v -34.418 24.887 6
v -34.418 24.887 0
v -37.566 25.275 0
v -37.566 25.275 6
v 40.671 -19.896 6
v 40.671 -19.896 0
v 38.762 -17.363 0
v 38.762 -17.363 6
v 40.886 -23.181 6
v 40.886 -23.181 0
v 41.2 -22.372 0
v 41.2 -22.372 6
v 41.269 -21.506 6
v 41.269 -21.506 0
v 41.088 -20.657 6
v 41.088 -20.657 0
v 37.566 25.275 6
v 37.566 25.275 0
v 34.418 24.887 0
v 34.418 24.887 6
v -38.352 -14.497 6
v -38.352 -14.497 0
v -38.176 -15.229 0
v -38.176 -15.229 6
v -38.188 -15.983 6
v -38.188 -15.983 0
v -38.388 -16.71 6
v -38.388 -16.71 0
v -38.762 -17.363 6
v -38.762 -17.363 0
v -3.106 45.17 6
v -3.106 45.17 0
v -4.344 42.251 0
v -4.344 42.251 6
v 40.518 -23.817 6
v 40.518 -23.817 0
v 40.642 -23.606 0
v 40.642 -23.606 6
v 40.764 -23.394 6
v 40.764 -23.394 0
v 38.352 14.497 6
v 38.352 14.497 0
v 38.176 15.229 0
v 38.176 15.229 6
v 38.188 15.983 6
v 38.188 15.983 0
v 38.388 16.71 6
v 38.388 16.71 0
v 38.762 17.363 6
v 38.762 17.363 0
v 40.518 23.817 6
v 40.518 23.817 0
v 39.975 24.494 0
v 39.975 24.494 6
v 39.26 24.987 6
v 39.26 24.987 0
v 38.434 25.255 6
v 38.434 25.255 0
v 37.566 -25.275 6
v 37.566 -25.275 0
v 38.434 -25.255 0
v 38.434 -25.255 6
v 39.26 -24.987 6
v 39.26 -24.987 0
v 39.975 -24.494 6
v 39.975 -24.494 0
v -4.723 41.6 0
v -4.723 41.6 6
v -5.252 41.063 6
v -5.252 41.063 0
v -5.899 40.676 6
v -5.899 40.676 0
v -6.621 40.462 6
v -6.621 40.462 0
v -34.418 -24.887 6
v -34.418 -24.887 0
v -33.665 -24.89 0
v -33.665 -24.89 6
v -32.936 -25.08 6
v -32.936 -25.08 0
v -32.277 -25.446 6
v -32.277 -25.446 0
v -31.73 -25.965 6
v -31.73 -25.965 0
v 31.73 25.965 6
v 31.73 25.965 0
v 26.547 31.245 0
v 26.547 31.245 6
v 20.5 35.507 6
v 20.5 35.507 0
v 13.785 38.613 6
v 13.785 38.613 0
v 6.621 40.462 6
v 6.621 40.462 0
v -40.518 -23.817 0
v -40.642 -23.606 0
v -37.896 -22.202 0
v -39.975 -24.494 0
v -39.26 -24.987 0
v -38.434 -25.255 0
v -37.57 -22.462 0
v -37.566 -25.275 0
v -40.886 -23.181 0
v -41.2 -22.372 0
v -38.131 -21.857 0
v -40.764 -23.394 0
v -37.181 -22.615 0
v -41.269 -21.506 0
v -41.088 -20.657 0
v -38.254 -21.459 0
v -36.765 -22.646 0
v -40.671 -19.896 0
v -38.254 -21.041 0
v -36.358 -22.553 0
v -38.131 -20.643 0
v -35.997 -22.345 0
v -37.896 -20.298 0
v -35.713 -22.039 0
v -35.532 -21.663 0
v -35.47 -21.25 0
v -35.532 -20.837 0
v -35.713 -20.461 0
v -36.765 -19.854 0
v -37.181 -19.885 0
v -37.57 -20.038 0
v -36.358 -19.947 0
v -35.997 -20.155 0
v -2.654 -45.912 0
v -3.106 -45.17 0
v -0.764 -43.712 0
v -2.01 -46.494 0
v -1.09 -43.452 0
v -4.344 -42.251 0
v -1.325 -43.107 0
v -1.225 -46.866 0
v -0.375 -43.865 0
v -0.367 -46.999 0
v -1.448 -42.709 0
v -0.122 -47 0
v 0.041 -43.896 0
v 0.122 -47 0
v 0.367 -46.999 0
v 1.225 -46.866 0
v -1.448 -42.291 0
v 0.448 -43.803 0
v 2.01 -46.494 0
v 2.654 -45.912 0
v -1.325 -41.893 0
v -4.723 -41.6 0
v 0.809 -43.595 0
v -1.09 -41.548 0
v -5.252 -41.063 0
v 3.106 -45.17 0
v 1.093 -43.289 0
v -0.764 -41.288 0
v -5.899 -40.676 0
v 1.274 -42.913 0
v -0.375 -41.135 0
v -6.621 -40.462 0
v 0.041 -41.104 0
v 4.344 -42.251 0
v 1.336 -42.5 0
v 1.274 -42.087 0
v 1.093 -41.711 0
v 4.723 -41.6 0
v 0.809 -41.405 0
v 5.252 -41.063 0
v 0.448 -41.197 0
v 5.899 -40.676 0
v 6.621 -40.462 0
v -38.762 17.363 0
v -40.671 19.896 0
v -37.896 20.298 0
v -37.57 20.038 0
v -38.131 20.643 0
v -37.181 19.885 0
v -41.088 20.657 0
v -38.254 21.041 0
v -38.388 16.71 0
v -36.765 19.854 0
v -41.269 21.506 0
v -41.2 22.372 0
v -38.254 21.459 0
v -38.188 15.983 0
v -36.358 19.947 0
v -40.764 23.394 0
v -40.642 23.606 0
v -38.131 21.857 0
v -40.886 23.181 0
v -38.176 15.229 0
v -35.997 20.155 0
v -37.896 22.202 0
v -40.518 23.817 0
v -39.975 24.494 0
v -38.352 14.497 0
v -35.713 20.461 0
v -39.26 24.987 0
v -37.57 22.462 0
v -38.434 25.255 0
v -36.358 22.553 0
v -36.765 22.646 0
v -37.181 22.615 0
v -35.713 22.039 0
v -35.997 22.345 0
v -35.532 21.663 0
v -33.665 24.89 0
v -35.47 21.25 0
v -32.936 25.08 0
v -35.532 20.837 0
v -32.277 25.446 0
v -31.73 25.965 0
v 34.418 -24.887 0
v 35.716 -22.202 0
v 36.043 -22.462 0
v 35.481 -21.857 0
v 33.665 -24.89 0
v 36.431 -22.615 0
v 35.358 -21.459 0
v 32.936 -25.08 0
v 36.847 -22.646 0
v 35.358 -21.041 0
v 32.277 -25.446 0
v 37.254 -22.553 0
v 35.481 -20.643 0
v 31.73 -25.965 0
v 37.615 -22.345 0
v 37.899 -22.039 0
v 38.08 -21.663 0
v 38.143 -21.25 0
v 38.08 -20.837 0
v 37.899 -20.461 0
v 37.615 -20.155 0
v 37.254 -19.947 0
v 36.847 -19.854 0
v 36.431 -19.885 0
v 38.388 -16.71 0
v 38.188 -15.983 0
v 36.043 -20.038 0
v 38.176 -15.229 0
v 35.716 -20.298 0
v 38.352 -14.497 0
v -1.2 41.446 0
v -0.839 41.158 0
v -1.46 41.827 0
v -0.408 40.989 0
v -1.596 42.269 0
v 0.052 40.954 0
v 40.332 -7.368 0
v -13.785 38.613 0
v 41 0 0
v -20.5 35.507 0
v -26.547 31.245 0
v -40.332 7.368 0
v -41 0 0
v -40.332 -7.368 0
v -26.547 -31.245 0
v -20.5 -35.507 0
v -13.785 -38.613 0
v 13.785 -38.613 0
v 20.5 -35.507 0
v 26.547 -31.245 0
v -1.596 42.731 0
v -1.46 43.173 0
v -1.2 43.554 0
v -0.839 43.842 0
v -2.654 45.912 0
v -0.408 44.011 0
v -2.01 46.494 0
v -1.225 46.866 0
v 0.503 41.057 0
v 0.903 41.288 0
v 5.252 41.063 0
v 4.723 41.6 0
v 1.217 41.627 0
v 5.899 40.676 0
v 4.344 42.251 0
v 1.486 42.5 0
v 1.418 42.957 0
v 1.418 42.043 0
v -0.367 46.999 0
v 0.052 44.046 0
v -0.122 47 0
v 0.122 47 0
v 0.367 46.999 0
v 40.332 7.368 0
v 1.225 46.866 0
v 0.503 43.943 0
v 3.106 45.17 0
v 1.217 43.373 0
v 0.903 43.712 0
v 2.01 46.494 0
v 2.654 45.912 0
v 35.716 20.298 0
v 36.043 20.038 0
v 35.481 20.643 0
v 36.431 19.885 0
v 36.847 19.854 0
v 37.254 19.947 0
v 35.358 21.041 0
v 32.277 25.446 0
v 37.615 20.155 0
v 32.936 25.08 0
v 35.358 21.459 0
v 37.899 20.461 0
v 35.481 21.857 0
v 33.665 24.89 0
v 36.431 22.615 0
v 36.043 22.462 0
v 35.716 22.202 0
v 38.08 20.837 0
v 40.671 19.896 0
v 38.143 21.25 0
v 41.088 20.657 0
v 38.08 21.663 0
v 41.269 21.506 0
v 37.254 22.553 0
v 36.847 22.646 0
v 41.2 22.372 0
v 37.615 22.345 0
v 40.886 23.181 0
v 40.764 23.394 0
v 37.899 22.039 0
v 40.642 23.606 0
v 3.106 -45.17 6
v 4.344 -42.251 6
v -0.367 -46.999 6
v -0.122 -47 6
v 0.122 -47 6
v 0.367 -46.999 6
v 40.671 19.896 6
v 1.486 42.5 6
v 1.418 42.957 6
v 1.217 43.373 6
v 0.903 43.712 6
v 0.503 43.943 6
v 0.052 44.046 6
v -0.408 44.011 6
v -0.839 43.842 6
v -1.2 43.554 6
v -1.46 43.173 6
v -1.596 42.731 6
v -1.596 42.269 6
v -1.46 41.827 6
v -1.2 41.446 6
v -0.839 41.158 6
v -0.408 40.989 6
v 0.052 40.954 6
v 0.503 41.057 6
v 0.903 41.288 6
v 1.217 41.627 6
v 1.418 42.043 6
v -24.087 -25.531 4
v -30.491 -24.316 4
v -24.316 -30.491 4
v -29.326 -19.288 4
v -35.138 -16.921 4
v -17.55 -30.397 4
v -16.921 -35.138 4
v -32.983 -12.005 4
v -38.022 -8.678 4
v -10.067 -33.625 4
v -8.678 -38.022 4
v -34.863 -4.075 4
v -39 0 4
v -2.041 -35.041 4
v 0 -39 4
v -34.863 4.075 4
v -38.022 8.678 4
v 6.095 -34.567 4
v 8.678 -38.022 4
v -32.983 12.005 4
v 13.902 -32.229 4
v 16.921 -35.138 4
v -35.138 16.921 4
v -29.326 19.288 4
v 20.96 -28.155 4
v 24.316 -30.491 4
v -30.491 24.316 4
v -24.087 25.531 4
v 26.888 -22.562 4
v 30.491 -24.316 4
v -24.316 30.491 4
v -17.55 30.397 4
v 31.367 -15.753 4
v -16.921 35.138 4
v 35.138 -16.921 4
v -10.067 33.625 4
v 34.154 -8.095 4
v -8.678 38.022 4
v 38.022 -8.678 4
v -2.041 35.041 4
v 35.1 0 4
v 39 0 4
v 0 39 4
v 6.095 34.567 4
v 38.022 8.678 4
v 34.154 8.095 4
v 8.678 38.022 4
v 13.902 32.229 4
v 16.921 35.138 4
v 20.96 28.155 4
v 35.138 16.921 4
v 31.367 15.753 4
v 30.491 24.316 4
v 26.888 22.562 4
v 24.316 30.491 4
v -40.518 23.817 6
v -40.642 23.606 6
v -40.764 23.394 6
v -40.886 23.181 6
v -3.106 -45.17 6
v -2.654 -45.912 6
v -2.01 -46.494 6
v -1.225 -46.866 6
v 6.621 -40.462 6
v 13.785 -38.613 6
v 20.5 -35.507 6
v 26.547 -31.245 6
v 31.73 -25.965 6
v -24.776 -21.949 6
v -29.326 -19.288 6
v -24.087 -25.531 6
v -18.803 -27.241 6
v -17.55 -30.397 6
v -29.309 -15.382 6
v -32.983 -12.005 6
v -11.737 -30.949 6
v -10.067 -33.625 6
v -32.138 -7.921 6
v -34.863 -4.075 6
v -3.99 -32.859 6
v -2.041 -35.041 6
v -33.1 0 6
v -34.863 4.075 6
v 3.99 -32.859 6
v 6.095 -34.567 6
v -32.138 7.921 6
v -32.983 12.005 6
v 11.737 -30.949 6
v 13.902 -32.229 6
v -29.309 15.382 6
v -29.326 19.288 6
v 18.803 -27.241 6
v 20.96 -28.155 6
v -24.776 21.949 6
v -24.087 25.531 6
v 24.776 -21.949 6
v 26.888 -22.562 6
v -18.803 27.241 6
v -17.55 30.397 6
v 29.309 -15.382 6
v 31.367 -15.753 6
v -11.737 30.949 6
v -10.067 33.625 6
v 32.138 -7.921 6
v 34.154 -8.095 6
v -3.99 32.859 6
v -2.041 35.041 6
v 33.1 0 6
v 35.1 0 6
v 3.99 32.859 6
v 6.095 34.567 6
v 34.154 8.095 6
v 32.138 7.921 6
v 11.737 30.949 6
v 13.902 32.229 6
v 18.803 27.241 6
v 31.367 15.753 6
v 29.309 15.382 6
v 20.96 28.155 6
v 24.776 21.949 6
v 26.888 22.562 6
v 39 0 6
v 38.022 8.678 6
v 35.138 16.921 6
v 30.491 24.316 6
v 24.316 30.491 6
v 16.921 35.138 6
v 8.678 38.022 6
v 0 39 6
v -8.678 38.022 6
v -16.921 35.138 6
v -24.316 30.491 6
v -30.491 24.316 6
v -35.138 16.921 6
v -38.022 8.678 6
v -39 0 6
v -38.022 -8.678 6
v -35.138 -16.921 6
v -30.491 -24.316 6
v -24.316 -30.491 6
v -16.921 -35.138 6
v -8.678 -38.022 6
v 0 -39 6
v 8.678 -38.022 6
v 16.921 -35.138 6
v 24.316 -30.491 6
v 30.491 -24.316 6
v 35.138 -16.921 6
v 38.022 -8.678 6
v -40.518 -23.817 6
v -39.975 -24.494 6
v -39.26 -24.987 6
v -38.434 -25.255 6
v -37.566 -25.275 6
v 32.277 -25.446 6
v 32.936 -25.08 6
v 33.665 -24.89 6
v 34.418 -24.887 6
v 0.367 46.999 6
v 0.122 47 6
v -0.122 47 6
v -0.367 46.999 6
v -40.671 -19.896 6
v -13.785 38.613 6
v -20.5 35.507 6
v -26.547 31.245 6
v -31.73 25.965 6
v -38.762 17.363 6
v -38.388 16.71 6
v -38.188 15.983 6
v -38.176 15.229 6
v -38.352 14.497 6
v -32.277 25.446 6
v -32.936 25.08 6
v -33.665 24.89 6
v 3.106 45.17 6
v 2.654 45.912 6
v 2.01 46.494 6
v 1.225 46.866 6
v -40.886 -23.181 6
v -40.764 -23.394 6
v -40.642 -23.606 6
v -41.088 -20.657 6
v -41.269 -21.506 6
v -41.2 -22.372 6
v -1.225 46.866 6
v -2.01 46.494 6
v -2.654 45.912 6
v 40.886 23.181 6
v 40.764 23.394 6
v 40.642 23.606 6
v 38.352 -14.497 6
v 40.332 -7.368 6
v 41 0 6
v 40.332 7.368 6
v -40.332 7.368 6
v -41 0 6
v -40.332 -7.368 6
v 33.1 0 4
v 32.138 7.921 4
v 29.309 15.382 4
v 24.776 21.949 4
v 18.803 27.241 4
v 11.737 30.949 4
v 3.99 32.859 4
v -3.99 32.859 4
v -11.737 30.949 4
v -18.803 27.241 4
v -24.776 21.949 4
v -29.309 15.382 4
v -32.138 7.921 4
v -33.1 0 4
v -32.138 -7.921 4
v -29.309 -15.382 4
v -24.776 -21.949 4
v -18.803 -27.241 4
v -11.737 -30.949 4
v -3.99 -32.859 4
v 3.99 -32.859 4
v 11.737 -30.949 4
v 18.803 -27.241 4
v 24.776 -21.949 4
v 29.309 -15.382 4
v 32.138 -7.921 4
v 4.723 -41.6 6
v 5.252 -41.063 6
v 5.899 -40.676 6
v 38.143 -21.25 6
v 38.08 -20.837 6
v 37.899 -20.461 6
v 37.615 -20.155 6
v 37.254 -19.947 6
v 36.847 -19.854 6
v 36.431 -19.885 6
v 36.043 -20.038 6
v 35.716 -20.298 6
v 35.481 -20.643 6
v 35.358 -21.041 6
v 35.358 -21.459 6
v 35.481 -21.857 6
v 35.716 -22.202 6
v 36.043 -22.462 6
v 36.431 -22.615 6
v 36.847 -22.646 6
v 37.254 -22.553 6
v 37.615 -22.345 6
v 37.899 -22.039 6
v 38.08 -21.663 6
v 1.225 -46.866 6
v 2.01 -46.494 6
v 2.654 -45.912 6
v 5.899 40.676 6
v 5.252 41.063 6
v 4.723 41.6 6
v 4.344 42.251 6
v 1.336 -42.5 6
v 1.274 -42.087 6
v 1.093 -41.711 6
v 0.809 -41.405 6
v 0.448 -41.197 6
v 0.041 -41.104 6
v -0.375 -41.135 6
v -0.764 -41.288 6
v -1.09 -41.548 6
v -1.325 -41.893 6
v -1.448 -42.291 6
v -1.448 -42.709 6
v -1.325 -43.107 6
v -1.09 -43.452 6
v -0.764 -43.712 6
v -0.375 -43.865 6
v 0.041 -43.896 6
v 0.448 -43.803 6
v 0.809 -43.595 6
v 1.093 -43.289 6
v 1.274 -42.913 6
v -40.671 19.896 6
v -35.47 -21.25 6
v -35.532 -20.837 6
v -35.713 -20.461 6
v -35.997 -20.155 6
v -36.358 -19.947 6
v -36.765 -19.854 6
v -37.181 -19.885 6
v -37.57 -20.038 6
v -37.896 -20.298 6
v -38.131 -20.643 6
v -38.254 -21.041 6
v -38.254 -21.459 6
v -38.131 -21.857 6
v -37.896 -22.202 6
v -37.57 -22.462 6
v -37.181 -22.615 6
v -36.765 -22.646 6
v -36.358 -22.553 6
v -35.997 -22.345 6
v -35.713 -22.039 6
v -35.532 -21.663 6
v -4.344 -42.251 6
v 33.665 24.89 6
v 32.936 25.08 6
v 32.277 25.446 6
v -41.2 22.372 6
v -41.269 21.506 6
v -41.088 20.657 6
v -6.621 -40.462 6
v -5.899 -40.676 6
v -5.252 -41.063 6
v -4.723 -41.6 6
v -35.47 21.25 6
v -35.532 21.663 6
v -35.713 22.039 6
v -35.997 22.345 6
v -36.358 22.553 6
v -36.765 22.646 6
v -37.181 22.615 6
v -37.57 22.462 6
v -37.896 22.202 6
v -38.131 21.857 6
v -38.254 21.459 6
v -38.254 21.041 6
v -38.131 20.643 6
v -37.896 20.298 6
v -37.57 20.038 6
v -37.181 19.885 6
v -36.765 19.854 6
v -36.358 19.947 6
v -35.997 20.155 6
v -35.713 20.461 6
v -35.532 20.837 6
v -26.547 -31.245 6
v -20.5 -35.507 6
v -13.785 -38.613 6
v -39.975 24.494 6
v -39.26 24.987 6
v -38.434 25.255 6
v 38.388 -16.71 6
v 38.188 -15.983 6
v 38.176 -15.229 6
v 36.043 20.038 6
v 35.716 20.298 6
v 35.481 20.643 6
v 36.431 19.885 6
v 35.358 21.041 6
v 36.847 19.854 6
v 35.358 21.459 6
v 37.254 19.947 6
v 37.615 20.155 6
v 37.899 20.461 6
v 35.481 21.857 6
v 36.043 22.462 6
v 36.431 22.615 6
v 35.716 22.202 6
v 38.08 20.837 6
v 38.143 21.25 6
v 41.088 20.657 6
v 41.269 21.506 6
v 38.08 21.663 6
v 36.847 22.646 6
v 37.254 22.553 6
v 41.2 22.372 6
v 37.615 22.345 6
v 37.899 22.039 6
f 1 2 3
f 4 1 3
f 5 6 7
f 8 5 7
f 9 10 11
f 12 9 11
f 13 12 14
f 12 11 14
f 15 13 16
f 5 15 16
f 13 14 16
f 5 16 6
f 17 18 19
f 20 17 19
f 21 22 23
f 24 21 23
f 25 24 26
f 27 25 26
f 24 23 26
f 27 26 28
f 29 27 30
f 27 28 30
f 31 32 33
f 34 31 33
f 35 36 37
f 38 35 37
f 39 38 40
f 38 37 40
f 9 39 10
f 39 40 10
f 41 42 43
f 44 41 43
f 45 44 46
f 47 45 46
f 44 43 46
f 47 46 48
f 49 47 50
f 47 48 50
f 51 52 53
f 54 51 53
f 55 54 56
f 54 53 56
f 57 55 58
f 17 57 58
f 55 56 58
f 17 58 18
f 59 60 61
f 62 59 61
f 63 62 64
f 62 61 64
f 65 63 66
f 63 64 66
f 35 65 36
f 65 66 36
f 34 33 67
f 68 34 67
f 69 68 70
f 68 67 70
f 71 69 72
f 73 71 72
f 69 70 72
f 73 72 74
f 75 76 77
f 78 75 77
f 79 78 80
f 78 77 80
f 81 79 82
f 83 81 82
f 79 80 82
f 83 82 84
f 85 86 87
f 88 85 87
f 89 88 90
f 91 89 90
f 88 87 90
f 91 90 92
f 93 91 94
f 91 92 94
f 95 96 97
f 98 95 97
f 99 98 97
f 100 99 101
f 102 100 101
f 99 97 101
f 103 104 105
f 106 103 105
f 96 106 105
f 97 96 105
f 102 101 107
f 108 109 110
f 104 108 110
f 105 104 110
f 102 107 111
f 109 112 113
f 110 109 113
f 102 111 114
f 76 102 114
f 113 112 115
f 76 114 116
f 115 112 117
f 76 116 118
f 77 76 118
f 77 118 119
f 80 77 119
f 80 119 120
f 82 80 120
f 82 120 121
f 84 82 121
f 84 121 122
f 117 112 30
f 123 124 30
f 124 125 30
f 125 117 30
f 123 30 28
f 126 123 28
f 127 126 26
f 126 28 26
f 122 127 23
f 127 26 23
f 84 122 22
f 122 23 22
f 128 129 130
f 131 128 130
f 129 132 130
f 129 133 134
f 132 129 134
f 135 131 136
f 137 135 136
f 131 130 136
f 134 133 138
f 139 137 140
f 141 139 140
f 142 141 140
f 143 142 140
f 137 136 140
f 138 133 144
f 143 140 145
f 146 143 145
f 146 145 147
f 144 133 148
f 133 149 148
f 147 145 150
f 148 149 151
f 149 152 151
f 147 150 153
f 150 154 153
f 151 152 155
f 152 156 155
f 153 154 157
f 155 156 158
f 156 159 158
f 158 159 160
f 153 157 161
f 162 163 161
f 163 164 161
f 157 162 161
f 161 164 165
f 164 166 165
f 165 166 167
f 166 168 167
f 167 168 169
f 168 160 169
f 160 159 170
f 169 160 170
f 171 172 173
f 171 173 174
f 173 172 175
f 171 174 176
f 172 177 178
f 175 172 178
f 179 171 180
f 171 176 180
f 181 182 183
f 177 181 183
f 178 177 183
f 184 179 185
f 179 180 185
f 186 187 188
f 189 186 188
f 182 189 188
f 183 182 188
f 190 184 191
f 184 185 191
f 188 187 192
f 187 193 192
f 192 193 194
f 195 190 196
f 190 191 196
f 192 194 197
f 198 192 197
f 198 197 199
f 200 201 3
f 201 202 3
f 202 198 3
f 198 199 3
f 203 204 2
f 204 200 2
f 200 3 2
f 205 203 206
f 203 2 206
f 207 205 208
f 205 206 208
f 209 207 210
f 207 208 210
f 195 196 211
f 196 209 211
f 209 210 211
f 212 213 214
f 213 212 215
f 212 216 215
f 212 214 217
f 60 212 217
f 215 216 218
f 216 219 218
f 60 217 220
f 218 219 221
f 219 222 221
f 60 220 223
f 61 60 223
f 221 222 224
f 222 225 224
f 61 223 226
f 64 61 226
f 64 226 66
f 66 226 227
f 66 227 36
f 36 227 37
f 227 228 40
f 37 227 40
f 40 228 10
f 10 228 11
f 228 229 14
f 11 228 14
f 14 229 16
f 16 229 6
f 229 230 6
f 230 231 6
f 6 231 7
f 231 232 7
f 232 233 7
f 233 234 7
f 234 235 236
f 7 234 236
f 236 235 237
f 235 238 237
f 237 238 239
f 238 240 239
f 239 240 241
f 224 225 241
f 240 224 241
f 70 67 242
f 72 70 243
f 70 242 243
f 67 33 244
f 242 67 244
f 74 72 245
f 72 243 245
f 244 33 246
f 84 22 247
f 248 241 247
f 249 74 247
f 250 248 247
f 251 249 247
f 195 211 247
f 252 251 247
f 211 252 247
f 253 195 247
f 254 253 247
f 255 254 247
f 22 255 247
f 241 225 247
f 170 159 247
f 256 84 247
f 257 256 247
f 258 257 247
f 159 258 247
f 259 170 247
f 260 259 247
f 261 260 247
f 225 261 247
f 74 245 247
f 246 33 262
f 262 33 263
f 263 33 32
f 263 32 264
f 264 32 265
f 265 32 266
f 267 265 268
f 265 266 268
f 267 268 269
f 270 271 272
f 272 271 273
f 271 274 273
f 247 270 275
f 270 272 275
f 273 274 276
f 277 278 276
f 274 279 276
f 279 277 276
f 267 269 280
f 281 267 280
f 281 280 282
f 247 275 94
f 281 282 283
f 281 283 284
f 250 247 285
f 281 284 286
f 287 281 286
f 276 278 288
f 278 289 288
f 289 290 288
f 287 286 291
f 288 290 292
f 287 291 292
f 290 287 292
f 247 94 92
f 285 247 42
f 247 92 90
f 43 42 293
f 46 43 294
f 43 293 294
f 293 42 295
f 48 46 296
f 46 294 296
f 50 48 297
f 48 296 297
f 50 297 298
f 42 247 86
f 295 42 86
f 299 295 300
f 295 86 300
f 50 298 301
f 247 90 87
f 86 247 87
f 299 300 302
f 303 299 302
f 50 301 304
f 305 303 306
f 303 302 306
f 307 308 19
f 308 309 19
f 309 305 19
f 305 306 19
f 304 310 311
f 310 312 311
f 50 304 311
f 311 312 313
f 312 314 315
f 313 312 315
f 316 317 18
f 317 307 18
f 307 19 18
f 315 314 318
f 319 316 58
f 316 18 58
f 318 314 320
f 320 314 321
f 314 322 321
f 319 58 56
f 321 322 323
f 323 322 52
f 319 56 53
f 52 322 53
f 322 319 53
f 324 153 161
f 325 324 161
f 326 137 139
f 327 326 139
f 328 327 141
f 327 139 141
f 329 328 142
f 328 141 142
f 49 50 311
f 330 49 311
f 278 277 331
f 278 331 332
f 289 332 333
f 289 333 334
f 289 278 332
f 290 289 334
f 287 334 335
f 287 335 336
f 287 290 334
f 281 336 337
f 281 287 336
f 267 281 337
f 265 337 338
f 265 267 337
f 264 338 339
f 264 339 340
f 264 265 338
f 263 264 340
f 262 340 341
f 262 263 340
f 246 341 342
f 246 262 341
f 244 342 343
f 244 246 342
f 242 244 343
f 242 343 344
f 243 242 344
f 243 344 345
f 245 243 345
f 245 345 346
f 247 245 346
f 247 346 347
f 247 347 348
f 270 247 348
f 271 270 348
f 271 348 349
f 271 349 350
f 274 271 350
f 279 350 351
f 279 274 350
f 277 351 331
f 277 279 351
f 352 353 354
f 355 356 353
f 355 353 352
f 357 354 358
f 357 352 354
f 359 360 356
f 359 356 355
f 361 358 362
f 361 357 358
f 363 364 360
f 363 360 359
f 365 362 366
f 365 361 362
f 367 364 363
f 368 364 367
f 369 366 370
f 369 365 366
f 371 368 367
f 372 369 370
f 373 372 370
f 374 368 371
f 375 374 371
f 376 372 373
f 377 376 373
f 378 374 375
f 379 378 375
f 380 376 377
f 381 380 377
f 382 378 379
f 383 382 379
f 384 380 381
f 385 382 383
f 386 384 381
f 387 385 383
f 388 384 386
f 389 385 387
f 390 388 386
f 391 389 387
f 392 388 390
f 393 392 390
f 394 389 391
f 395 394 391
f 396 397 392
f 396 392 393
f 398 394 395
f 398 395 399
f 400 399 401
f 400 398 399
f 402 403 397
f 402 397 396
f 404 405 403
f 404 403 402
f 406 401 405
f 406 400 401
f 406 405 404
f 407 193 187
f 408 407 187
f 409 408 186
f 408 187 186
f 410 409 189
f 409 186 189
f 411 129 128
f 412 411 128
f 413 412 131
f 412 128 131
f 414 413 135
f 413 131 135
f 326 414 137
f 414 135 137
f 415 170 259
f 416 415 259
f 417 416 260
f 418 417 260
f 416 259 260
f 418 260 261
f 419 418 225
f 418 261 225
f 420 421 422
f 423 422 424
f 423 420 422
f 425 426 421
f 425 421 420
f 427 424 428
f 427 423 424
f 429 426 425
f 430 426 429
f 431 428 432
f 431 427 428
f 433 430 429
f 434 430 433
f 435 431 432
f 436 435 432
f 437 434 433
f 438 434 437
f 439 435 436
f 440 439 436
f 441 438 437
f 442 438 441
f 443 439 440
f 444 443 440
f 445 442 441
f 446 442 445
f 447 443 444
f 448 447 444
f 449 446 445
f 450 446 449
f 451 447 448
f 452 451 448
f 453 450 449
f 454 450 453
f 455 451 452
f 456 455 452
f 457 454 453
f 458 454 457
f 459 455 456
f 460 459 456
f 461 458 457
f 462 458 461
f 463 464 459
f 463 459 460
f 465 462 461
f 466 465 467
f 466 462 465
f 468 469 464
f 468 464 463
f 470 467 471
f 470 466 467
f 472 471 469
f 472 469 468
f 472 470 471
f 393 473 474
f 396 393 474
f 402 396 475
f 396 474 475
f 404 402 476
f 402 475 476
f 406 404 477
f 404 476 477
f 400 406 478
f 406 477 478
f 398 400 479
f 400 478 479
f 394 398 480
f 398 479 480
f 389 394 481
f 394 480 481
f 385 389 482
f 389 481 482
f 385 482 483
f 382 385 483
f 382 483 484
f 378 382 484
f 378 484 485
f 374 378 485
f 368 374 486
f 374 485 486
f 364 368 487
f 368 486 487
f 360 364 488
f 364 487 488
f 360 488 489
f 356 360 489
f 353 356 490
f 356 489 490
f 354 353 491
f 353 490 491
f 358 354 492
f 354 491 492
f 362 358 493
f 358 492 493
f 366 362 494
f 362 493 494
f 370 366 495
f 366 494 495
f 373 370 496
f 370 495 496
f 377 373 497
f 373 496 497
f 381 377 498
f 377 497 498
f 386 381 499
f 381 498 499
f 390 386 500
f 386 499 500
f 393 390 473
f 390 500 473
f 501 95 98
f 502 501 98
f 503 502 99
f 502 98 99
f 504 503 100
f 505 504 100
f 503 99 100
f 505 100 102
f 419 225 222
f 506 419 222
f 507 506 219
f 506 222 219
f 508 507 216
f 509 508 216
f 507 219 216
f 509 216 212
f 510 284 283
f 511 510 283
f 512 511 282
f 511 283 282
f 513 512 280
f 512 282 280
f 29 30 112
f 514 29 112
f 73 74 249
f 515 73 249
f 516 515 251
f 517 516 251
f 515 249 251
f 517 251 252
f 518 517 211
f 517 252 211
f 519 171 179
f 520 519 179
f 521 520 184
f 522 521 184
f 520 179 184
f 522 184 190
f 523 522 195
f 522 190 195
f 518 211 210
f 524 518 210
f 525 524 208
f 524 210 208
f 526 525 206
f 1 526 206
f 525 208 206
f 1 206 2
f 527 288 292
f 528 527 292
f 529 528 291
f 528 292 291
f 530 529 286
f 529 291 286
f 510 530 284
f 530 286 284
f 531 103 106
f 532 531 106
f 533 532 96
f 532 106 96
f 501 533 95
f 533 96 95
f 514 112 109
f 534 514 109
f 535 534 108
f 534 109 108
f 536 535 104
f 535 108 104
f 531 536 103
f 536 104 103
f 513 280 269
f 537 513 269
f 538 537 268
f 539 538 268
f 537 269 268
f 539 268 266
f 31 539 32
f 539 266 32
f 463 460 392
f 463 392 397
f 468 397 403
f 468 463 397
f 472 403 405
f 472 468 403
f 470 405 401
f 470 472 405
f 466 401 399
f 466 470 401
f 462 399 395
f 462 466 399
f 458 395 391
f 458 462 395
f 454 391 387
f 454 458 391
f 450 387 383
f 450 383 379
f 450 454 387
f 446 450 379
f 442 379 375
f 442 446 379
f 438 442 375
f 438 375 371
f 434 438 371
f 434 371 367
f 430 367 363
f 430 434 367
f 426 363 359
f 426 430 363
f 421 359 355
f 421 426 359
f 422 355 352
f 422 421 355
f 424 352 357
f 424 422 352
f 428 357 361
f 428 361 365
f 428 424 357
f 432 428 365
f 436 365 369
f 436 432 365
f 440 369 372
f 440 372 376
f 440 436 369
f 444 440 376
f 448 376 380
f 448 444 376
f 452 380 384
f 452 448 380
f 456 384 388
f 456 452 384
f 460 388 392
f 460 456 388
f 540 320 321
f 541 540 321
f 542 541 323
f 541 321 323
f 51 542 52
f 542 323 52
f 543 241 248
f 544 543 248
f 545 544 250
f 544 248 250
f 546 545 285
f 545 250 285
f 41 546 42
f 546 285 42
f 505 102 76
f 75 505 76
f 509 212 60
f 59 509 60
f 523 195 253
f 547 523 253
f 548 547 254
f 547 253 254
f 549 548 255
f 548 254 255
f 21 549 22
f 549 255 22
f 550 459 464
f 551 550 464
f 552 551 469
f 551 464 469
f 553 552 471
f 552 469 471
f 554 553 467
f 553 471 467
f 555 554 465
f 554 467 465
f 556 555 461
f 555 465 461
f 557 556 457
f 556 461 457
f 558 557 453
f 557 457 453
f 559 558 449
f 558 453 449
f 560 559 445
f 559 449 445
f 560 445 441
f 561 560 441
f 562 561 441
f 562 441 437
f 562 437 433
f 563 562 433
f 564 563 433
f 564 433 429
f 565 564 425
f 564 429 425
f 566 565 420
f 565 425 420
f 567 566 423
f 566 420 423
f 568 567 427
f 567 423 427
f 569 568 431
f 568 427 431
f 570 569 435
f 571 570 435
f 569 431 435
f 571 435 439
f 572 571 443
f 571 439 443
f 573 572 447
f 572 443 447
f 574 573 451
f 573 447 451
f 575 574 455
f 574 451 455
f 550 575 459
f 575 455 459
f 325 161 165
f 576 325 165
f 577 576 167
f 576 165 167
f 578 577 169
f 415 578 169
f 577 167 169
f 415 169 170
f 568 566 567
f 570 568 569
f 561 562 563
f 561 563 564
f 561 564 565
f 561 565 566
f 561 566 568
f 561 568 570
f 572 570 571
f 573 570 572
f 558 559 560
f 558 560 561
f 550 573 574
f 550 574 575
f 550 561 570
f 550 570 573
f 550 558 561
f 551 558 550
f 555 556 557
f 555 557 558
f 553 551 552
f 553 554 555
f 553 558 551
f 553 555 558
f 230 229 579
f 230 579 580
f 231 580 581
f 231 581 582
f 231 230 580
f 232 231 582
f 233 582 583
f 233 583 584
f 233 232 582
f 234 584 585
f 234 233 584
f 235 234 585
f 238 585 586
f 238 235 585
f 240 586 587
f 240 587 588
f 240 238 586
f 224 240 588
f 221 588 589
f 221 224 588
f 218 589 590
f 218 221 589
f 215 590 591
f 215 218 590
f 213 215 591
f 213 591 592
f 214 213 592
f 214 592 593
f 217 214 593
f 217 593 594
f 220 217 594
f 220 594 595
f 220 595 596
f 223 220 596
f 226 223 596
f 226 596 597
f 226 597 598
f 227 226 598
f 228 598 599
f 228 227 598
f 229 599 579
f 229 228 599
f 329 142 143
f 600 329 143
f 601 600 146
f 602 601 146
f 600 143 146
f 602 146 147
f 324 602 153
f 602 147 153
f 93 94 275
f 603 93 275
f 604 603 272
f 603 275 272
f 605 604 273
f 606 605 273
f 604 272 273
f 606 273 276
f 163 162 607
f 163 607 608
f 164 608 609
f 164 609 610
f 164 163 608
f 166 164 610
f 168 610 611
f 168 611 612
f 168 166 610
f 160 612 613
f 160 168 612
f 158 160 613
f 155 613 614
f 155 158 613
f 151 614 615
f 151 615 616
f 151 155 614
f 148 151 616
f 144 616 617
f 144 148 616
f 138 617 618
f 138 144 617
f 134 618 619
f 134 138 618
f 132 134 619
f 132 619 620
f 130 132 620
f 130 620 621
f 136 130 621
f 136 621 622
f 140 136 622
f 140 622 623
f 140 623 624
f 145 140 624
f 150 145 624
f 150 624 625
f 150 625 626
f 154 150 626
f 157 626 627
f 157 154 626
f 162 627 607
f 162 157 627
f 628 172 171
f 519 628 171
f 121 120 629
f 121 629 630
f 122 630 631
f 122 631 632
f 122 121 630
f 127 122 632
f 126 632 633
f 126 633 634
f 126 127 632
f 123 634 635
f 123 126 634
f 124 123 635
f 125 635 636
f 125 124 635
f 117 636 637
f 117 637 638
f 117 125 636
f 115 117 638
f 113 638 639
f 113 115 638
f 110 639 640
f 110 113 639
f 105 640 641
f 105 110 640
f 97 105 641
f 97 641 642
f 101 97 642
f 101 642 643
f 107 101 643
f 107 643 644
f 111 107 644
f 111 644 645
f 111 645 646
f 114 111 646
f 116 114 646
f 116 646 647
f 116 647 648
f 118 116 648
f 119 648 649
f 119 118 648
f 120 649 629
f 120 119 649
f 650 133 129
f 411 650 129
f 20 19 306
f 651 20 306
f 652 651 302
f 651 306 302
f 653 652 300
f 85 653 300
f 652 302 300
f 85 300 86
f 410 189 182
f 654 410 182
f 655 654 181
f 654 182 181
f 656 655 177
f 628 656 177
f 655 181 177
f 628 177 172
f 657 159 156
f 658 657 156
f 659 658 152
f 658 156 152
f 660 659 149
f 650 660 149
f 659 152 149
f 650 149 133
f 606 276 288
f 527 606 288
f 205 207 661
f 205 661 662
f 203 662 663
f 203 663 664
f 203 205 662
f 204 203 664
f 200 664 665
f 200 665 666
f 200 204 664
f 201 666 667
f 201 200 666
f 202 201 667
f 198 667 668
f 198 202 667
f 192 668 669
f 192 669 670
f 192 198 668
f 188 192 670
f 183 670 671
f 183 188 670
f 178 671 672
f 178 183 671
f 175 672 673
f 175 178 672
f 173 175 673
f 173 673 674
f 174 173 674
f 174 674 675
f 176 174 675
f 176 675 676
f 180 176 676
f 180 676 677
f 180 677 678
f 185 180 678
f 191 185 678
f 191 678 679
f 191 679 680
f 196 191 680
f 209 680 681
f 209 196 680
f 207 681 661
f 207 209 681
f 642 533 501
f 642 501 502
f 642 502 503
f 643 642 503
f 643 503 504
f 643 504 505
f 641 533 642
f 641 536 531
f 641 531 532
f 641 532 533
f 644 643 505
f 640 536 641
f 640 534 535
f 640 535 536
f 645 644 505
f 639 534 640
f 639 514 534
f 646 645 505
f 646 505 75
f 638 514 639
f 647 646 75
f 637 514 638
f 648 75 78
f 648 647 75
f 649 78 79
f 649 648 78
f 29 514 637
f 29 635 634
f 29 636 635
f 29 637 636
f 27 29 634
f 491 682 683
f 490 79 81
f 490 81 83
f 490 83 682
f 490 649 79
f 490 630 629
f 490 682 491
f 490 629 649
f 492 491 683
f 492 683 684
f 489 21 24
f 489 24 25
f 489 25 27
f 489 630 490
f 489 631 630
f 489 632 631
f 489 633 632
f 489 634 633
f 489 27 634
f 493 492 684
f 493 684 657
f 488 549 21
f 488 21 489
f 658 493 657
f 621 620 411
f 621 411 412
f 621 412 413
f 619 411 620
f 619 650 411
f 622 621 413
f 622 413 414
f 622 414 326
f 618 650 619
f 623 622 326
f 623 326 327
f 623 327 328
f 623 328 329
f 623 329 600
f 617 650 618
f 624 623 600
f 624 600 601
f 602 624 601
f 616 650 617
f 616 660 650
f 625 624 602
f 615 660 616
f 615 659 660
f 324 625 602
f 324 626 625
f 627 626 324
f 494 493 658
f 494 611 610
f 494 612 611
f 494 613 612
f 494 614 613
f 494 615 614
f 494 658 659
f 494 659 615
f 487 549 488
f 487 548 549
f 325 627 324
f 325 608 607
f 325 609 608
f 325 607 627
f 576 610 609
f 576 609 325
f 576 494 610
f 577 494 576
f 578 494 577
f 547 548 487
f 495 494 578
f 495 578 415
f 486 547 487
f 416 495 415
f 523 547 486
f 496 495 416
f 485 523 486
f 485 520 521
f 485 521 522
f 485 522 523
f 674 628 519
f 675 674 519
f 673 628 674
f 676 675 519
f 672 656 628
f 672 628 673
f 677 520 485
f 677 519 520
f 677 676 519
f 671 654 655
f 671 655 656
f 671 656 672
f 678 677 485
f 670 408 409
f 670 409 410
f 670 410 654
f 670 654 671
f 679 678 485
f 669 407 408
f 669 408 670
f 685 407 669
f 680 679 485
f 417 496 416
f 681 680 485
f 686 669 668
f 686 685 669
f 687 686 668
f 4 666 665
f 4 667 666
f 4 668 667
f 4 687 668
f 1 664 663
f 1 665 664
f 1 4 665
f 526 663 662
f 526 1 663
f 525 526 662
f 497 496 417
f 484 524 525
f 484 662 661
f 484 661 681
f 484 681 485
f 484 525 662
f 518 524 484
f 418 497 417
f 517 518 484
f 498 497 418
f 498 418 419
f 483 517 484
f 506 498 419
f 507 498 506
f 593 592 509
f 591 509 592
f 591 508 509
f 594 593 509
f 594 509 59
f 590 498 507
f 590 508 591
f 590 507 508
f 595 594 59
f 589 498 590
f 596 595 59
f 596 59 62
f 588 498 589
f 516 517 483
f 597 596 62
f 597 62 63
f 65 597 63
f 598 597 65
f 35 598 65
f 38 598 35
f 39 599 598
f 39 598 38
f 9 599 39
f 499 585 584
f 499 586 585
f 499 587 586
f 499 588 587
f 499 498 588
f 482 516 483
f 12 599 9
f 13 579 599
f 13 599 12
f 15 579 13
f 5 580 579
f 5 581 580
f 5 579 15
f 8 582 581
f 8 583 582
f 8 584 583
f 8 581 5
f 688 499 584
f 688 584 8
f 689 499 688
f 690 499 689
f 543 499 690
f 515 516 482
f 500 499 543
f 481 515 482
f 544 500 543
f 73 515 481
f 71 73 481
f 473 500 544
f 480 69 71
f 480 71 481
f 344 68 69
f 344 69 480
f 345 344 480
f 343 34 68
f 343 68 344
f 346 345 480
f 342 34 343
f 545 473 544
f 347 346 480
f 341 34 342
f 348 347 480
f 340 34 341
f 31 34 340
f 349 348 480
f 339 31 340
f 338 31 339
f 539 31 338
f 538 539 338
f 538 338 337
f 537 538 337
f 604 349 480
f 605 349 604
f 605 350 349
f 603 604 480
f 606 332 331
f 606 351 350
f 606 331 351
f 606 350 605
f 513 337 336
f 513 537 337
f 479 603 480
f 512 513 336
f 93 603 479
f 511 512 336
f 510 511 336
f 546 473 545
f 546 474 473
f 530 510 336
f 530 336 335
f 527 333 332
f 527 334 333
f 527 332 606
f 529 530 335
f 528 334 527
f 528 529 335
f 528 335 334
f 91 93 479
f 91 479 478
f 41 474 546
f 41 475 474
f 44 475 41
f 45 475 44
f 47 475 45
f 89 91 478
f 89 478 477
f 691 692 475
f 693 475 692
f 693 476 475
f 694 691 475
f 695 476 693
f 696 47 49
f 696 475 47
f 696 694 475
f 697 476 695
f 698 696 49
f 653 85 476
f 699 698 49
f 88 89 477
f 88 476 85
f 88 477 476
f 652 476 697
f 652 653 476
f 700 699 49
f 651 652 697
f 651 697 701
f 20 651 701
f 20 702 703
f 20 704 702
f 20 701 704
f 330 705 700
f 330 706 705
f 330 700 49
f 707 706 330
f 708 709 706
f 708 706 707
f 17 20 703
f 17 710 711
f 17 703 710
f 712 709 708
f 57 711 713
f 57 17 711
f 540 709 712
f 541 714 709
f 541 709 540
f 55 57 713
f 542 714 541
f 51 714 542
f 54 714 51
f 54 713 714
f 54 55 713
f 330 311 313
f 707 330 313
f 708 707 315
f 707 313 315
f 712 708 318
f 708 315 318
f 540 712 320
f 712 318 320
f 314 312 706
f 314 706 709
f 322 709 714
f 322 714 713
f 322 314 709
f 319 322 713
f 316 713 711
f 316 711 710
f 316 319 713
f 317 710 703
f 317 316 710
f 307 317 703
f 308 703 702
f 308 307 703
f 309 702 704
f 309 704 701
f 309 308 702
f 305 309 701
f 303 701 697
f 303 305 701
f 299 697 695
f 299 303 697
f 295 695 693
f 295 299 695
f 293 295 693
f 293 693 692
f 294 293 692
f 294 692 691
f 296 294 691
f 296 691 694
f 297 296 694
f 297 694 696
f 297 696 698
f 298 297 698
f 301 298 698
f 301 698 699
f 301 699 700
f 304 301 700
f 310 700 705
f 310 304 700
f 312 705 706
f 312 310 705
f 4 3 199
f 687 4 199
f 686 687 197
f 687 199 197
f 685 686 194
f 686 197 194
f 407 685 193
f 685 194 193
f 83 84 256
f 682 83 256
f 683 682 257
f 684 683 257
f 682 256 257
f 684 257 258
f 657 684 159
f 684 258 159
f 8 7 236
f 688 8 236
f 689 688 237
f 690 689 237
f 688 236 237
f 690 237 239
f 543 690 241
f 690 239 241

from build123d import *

# Parameters (mm, degrees)
SKETCH1_R           = 1.55
SKETCH1_R_2         = 1.4
BOSS_EXTRUDE1_DEPTH = 6
SKETCH2_R           = 39
SKETCH2_R_2         = 35.1
SKETCH2_R_3         = 33.1
CUT_EXTRUDE1_DEPTH  = 2


with BuildPart() as part:
    # Sketch1 → Boss-Extrude1 (new body)
    with BuildSketch(Plane.XY):
        with BuildLine():
            Line((-3.10553267, 45.170231176), (-4.343955751, 42.250868995))
            ThreePointArc((-4.343955751, 42.250868995), (-5.25243282, 41.063358876), (-6.621251333, 40.461821891))
            ThreePointArc((-6.621251333, 40.461821891), (-20.5, 35.507041555), (-31.730339975, 25.965082805))
            ThreePointArc((-31.730339975, 25.965082805), (-32.935695541, 25.080419692), (-34.418348006, 24.887410531))
            Line((-34.418348006, 24.887410531), (-37.565801358, 25.274585773))
            ThreePointArc((-37.565801358, 25.274585773), (-39.259871006, 24.987189905), (-40.518355186, 23.817281394))
            ThreePointArc((-40.518355186, 23.817281394), (-40.703193978, 23.5), (-40.88554833, 23.181284214))
            ThreePointArc((-40.88554833, 23.181284214), (-41.26947673, 21.506450688), (-40.671334028, 19.895645403))
            Line((-40.671334028, 19.895645403), (-38.762303757, 17.363458464))
            ThreePointArc((-38.762303757, 17.363458464), (-38.188128361, 15.982939184), (-38.351591308, 14.496739086))
            ThreePointArc((-38.351591308, 14.496739086), (-41, 0), (-38.351591308, -14.496739086))
            ThreePointArc((-38.351591308, -14.496739086), (-38.188128361, -15.982939184), (-38.762303757, -17.363458464))
            Line((-38.762303757, -17.363458464), (-40.671334028, -19.895645403))
            ThreePointArc((-40.671334028, -19.895645403), (-41.26947673, -21.506450688), (-40.88554833, -23.181284214))
            ThreePointArc((-40.88554833, -23.181284214), (-40.703193978, -23.5), (-40.518355186, -23.817281394))
            ThreePointArc((-40.518355186, -23.817281394), (-39.259871006, -24.987189905), (-37.565801358, -25.274585773))
            Line((-37.565801358, -25.274585773), (-34.418348006, -24.887410531))
            ThreePointArc((-34.418348006, -24.887410531), (-32.935695541, -25.080419692), (-31.730339975, -25.965082805))
            ThreePointArc((-31.730339975, -25.965082805), (-20.5, -35.507041555), (-6.621251333, -40.461821891))
            ThreePointArc((-6.621251333, -40.461821891), (-5.25243282, -41.063358876), (-4.343955751, -42.250868995))
            Line((-4.343955751, -42.250868995), (-3.10553267, -45.170231176))
            ThreePointArc((-3.10553267, -45.170231176), (-2.009605724, -46.493640593), (-0.367193143, -46.998565608))
            ThreePointArc((-0.367193143, -46.998565608), (0, -47), (0.367193143, -46.998565608))
            ThreePointArc((0.367193143, -46.998565608), (2.009605724, -46.493640593), (3.10553267, -45.170231176))
            Line((3.10553267, -45.170231176), (4.343955751, -42.250868995))
            ThreePointArc((4.343955751, -42.250868995), (5.25243282, -41.063358876), (6.621251333, -40.461821891))
            ThreePointArc((6.621251333, -40.461821891), (20.5, -35.507041555), (31.730339975, -25.965082805))
            ThreePointArc((31.730339975, -25.965082805), (32.935695541, -25.080419692), (34.418348006, -24.887410531))
            Line((34.418348006, -24.887410531), (37.565801358, -25.274585773))
            ThreePointArc((37.565801358, -25.274585773), (39.259871006, -24.987189905), (40.518355186, -23.817281394))
            ThreePointArc((40.518355186, -23.817281394), (40.703193978, -23.5), (40.88554833, -23.181284214))
            ThreePointArc((40.88554833, -23.181284214), (41.26947673, -21.506450688), (40.671334028, -19.895645403))
            Line((40.671334028, -19.895645403), (38.762303757, -17.363458464))
            ThreePointArc((38.762303757, -17.363458464), (38.188128361, -15.982939184), (38.351591308, -14.496739086))
            ThreePointArc((38.351591308, -14.496739086), (41, 0), (38.351591308, 14.496739086))
            ThreePointArc((38.351591308, 14.496739086), (38.188128361, 15.982939184), (38.762303757, 17.363458464))
            Line((38.762303757, 17.363458464), (40.671334028, 19.895645403))
            ThreePointArc((40.671334028, 19.895645403), (41.26947673, 21.506450688), (40.88554833, 23.181284214))
            ThreePointArc((40.88554833, 23.181284214), (40.703193978, 23.5), (40.518355186, 23.817281394))
            ThreePointArc((40.518355186, 23.817281394), (39.259871006, 24.987189905), (37.565801358, 25.274585773))
            Line((37.565801358, 25.274585773), (34.418348006, 24.887410531))
            ThreePointArc((34.418348006, 24.887410531), (32.935695541, 25.080419692), (31.730339975, 25.965082805))
            ThreePointArc((31.730339975, 25.965082805), (20.5, 35.507041555), (6.621251333, 40.461821891))
            ThreePointArc((6.621251333, 40.461821891), (5.25243282, 41.063358876), (4.343955751, 42.250868995))
            Line((4.343955751, 42.250868995), (3.10553267, 45.170231176))
            ThreePointArc((3.10553267, 45.170231176), (2.009605724, 46.493640593), (0.367193143, 46.998565608))
            ThreePointArc((0.367193143, 46.998565608), (0, 47), (-0.367193143, 46.998565608))
            ThreePointArc((-0.367193143, 46.998565608), (-2.009605724, 46.493640593), (-3.10553267, 45.170231176))
        make_face()
        with Locations((-0.063500562, 42.49999948)):
            Circle(SKETCH1_R, mode=Mode.SUBTRACT)
        with Locations((36.742579098, 21.24999948)):
            Circle(SKETCH1_R_2, mode=Mode.SUBTRACT)
        with Locations((36.742579098, -21.25000052)):
            Circle(SKETCH1_R_2, mode=Mode.SUBTRACT)
        with Locations((-0.063500562, -42.50000052)):
            Circle(SKETCH1_R_2, mode=Mode.SUBTRACT)
        with Locations((-36.869580223, -21.25000052)):
            Circle(SKETCH1_R_2, mode=Mode.SUBTRACT)
        with Locations((-36.869580223, 21.24999948)):
            Circle(SKETCH1_R_2, mode=Mode.SUBTRACT)
    extrude(amount=BOSS_EXTRUDE1_DEPTH)

    # Sketch2 → Cut-Extrude1 (cut)
    # profile 1 of 2: a face of its own
    with BuildSketch(Plane.XY.offset(6)):
        Circle(SKETCH2_R)
        Circle(SKETCH2_R_2, mode=Mode.SUBTRACT)
    # profile 2 of 2: a face of its own
    with BuildSketch(Plane.XY.offset(6)):
        Circle(SKETCH2_R_3)
    extrude(amount=-CUT_EXTRUDE1_DEPTH, mode=Mode.SUBTRACT)


solid = part.part
